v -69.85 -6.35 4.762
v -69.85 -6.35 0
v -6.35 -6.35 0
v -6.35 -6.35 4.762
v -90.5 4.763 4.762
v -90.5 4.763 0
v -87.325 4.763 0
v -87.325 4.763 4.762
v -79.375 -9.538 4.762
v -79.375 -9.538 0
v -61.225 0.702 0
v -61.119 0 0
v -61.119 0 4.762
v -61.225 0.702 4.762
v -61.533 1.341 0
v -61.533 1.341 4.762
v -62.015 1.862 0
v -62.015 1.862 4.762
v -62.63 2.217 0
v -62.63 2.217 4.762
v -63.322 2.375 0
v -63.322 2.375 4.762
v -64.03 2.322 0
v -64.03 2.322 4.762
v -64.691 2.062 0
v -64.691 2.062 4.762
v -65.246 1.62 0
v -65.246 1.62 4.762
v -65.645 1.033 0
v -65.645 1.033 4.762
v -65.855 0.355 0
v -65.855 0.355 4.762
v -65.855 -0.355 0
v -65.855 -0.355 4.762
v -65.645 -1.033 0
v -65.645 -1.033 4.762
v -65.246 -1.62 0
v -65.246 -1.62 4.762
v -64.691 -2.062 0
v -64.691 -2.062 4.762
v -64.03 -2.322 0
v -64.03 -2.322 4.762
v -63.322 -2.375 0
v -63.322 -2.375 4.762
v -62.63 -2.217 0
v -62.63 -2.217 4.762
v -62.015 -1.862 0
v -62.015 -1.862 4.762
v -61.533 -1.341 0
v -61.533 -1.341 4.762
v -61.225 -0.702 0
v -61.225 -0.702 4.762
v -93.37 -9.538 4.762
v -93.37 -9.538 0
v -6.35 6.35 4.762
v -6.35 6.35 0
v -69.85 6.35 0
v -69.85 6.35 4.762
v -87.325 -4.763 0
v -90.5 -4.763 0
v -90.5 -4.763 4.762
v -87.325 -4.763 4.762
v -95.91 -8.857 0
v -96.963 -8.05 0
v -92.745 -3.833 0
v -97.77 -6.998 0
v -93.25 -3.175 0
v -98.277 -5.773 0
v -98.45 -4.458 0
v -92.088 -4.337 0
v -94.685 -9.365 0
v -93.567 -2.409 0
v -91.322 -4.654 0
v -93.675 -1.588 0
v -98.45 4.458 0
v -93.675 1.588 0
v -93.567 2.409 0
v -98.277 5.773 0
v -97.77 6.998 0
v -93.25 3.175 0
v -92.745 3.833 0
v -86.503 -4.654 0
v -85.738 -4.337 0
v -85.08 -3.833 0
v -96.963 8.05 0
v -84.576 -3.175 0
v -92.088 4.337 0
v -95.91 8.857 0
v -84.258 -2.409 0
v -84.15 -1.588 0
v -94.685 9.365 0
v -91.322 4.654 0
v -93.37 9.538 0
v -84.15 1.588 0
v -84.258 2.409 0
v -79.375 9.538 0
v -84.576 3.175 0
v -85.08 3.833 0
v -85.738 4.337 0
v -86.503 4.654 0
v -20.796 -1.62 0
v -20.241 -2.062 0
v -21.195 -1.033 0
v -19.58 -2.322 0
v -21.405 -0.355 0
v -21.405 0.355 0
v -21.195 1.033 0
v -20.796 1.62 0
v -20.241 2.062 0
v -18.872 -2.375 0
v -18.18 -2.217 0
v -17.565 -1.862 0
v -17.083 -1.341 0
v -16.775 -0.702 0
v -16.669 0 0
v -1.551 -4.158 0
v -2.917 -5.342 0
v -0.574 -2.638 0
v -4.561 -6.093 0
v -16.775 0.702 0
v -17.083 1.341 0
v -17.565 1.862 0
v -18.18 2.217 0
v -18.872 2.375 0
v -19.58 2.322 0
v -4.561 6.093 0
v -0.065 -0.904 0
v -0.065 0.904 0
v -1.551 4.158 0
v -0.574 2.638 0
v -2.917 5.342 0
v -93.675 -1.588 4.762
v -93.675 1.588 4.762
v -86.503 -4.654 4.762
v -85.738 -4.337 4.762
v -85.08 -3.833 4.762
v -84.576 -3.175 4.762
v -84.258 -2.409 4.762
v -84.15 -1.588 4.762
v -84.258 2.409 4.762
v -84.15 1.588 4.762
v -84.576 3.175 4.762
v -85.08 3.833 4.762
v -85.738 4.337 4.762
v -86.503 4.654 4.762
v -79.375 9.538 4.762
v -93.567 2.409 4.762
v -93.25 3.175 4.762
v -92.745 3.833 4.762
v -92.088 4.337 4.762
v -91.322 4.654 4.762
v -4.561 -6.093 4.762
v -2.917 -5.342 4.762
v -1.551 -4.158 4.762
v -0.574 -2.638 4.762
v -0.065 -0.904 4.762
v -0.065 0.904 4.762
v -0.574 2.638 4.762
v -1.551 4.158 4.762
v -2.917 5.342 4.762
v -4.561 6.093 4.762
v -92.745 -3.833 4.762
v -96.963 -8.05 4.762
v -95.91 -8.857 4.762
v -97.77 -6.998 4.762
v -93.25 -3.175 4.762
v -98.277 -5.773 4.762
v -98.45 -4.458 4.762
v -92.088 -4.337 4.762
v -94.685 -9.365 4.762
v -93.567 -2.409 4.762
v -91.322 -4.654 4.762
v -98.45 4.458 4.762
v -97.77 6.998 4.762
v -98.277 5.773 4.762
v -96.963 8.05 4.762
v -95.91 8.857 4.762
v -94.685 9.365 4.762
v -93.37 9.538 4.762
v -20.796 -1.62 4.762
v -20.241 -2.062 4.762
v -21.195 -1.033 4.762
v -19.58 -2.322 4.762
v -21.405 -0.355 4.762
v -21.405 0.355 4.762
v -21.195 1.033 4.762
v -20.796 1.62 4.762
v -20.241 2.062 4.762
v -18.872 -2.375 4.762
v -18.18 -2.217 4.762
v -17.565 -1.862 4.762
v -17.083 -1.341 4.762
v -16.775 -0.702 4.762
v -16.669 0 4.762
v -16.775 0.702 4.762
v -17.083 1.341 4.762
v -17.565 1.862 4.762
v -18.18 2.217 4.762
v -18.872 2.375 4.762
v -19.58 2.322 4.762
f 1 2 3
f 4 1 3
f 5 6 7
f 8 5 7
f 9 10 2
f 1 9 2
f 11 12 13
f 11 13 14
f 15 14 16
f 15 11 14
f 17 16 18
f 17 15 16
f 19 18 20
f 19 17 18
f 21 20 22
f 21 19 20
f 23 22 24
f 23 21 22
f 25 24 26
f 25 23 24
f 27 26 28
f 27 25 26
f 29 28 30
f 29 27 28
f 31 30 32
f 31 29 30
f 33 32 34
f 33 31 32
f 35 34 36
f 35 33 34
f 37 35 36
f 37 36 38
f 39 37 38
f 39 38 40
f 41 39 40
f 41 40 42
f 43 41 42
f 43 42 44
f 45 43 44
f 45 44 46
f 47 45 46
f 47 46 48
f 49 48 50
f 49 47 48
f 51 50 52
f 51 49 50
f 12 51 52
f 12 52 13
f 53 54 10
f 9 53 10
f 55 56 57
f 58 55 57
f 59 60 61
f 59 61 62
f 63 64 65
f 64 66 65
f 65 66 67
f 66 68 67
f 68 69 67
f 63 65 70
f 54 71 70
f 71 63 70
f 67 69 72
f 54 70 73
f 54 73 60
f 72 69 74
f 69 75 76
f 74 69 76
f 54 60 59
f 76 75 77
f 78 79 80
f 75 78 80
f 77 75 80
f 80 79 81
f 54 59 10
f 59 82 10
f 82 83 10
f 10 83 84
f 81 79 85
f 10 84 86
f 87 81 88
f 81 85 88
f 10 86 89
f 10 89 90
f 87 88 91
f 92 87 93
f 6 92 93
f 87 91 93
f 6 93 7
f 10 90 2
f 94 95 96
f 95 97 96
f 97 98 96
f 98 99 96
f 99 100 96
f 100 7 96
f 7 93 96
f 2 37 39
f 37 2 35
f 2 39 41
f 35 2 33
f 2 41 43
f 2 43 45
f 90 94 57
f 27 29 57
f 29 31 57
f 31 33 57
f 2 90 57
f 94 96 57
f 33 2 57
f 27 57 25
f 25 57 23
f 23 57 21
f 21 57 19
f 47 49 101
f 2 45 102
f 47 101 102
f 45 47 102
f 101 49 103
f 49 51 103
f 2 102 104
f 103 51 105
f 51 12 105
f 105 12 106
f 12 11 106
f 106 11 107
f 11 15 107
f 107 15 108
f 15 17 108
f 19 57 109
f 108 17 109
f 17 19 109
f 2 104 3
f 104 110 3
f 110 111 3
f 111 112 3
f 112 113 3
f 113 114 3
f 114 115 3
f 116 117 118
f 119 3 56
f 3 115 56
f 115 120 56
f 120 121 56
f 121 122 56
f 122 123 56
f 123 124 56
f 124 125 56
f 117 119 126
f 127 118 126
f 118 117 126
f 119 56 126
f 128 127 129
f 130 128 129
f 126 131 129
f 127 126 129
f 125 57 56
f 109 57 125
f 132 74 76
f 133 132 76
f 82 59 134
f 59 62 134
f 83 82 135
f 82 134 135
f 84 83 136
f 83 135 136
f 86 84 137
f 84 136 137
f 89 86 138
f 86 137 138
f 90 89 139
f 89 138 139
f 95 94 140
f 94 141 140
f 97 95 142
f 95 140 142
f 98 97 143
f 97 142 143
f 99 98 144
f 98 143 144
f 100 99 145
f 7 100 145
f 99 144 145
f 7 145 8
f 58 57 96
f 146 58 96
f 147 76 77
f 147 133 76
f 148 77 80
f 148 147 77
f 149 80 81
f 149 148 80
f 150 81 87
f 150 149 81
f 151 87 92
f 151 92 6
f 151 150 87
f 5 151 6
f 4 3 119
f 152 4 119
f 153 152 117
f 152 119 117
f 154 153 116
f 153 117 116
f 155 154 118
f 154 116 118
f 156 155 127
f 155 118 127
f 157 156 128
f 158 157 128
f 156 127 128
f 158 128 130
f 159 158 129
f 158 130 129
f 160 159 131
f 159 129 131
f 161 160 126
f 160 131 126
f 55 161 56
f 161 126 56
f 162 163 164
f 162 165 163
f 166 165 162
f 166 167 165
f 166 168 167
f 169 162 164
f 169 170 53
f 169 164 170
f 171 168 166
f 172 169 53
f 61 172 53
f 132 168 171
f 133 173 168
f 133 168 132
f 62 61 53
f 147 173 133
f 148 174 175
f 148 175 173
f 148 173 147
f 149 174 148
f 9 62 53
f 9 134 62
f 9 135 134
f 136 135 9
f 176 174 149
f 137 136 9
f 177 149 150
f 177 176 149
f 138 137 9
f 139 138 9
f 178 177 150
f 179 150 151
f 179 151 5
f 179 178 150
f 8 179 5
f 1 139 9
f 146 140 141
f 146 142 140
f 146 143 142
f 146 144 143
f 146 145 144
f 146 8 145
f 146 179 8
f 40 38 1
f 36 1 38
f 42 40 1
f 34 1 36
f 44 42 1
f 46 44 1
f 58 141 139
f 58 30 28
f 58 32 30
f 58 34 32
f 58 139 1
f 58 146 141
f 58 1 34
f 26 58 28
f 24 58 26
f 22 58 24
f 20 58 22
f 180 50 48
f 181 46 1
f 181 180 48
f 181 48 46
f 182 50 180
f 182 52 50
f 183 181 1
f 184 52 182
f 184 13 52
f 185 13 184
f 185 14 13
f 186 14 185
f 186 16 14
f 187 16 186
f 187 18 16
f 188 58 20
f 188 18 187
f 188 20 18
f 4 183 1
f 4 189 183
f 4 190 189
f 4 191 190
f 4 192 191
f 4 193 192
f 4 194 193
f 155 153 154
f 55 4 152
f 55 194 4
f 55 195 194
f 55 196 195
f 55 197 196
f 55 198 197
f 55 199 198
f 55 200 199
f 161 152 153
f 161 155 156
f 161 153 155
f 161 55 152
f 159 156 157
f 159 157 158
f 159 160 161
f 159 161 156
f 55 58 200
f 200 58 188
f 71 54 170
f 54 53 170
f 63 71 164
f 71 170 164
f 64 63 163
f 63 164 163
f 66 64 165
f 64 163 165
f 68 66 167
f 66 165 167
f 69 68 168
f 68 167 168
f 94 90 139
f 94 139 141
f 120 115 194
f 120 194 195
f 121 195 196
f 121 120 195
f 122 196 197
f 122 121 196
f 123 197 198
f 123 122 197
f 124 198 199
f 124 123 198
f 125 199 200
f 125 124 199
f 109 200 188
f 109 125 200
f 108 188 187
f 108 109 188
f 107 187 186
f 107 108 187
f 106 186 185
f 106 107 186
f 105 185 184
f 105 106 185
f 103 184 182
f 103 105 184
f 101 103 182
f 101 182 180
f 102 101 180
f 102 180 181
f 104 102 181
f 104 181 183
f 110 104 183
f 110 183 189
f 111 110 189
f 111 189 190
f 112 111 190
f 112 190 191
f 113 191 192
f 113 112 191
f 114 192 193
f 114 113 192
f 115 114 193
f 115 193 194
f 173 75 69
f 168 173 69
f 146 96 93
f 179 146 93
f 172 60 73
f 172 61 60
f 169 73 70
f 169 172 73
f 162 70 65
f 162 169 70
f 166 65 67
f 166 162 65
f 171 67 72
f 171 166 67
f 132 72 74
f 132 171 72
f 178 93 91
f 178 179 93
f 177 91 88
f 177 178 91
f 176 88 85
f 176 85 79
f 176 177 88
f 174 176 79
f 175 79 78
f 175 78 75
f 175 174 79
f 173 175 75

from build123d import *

# Parameters (mm, degrees)
F0_W     = 9.525
F0_H     = 9.525
F0_R     = 2.38125
F1_DEPTH = 4.7625
F2_R     = 5.08
F3_R     = 3.175


with BuildPart() as f1:
    # F0 (on Top) → F1 (new body)
    with BuildSketch(Plane.XY):
        with BuildLine():
            ThreePointArc((-6.35, -6.35), (0, 0), (-6.35, 6.35))
            Line((-6.35, 6.35), (-69.85, 6.35))
            Line((-69.85, 6.35), (-79.375, 9.5377))
            Line((-79.375, 9.5377), (-98.4504, 9.5377))
            Line((-98.4504, 9.5377), (-98.4504, -9.5377))
            Line((-98.4504, -9.5377), (-79.375, -9.5377))
            Line((-79.375, -9.5377), (-69.85, -6.35))
            Line((-69.85, -6.35), (-6.35, -6.35))
        make_face()
        with Locations((-88.9127, 0)):
            Rectangle(F0_W, F0_H, mode=Mode.SUBTRACT)
        with Locations((-63.5, 0)):
            Circle(F0_R, mode=Mode.SUBTRACT)
        with Locations((-19.05, 0)):
            Circle(F0_R, mode=Mode.SUBTRACT)
    extrude(amount=F1_DEPTH)

    # F2
    f2_edges = [f1.edges().sort_by_distance(p)[0] for p in [
        (-98.4504, 9.5377, 2.38125),
        (-98.4504, -9.5377, 2.38125),
    ]]
    fillet(f2_edges, radius=F2_R)

    # F3
    f3_edges = [f1.edges().sort_by_distance(p)[0] for p in [
        (-84.1502, -4.7625, 2.38125),
        (-84.1502, 4.7625, 2.38125),
        (-93.6752, 4.7625, 2.38125),
        (-93.6752, -4.7625, 2.38125),
    ]]
    fillet(f3_edges, radius=F3_R)


solid = f1.part
